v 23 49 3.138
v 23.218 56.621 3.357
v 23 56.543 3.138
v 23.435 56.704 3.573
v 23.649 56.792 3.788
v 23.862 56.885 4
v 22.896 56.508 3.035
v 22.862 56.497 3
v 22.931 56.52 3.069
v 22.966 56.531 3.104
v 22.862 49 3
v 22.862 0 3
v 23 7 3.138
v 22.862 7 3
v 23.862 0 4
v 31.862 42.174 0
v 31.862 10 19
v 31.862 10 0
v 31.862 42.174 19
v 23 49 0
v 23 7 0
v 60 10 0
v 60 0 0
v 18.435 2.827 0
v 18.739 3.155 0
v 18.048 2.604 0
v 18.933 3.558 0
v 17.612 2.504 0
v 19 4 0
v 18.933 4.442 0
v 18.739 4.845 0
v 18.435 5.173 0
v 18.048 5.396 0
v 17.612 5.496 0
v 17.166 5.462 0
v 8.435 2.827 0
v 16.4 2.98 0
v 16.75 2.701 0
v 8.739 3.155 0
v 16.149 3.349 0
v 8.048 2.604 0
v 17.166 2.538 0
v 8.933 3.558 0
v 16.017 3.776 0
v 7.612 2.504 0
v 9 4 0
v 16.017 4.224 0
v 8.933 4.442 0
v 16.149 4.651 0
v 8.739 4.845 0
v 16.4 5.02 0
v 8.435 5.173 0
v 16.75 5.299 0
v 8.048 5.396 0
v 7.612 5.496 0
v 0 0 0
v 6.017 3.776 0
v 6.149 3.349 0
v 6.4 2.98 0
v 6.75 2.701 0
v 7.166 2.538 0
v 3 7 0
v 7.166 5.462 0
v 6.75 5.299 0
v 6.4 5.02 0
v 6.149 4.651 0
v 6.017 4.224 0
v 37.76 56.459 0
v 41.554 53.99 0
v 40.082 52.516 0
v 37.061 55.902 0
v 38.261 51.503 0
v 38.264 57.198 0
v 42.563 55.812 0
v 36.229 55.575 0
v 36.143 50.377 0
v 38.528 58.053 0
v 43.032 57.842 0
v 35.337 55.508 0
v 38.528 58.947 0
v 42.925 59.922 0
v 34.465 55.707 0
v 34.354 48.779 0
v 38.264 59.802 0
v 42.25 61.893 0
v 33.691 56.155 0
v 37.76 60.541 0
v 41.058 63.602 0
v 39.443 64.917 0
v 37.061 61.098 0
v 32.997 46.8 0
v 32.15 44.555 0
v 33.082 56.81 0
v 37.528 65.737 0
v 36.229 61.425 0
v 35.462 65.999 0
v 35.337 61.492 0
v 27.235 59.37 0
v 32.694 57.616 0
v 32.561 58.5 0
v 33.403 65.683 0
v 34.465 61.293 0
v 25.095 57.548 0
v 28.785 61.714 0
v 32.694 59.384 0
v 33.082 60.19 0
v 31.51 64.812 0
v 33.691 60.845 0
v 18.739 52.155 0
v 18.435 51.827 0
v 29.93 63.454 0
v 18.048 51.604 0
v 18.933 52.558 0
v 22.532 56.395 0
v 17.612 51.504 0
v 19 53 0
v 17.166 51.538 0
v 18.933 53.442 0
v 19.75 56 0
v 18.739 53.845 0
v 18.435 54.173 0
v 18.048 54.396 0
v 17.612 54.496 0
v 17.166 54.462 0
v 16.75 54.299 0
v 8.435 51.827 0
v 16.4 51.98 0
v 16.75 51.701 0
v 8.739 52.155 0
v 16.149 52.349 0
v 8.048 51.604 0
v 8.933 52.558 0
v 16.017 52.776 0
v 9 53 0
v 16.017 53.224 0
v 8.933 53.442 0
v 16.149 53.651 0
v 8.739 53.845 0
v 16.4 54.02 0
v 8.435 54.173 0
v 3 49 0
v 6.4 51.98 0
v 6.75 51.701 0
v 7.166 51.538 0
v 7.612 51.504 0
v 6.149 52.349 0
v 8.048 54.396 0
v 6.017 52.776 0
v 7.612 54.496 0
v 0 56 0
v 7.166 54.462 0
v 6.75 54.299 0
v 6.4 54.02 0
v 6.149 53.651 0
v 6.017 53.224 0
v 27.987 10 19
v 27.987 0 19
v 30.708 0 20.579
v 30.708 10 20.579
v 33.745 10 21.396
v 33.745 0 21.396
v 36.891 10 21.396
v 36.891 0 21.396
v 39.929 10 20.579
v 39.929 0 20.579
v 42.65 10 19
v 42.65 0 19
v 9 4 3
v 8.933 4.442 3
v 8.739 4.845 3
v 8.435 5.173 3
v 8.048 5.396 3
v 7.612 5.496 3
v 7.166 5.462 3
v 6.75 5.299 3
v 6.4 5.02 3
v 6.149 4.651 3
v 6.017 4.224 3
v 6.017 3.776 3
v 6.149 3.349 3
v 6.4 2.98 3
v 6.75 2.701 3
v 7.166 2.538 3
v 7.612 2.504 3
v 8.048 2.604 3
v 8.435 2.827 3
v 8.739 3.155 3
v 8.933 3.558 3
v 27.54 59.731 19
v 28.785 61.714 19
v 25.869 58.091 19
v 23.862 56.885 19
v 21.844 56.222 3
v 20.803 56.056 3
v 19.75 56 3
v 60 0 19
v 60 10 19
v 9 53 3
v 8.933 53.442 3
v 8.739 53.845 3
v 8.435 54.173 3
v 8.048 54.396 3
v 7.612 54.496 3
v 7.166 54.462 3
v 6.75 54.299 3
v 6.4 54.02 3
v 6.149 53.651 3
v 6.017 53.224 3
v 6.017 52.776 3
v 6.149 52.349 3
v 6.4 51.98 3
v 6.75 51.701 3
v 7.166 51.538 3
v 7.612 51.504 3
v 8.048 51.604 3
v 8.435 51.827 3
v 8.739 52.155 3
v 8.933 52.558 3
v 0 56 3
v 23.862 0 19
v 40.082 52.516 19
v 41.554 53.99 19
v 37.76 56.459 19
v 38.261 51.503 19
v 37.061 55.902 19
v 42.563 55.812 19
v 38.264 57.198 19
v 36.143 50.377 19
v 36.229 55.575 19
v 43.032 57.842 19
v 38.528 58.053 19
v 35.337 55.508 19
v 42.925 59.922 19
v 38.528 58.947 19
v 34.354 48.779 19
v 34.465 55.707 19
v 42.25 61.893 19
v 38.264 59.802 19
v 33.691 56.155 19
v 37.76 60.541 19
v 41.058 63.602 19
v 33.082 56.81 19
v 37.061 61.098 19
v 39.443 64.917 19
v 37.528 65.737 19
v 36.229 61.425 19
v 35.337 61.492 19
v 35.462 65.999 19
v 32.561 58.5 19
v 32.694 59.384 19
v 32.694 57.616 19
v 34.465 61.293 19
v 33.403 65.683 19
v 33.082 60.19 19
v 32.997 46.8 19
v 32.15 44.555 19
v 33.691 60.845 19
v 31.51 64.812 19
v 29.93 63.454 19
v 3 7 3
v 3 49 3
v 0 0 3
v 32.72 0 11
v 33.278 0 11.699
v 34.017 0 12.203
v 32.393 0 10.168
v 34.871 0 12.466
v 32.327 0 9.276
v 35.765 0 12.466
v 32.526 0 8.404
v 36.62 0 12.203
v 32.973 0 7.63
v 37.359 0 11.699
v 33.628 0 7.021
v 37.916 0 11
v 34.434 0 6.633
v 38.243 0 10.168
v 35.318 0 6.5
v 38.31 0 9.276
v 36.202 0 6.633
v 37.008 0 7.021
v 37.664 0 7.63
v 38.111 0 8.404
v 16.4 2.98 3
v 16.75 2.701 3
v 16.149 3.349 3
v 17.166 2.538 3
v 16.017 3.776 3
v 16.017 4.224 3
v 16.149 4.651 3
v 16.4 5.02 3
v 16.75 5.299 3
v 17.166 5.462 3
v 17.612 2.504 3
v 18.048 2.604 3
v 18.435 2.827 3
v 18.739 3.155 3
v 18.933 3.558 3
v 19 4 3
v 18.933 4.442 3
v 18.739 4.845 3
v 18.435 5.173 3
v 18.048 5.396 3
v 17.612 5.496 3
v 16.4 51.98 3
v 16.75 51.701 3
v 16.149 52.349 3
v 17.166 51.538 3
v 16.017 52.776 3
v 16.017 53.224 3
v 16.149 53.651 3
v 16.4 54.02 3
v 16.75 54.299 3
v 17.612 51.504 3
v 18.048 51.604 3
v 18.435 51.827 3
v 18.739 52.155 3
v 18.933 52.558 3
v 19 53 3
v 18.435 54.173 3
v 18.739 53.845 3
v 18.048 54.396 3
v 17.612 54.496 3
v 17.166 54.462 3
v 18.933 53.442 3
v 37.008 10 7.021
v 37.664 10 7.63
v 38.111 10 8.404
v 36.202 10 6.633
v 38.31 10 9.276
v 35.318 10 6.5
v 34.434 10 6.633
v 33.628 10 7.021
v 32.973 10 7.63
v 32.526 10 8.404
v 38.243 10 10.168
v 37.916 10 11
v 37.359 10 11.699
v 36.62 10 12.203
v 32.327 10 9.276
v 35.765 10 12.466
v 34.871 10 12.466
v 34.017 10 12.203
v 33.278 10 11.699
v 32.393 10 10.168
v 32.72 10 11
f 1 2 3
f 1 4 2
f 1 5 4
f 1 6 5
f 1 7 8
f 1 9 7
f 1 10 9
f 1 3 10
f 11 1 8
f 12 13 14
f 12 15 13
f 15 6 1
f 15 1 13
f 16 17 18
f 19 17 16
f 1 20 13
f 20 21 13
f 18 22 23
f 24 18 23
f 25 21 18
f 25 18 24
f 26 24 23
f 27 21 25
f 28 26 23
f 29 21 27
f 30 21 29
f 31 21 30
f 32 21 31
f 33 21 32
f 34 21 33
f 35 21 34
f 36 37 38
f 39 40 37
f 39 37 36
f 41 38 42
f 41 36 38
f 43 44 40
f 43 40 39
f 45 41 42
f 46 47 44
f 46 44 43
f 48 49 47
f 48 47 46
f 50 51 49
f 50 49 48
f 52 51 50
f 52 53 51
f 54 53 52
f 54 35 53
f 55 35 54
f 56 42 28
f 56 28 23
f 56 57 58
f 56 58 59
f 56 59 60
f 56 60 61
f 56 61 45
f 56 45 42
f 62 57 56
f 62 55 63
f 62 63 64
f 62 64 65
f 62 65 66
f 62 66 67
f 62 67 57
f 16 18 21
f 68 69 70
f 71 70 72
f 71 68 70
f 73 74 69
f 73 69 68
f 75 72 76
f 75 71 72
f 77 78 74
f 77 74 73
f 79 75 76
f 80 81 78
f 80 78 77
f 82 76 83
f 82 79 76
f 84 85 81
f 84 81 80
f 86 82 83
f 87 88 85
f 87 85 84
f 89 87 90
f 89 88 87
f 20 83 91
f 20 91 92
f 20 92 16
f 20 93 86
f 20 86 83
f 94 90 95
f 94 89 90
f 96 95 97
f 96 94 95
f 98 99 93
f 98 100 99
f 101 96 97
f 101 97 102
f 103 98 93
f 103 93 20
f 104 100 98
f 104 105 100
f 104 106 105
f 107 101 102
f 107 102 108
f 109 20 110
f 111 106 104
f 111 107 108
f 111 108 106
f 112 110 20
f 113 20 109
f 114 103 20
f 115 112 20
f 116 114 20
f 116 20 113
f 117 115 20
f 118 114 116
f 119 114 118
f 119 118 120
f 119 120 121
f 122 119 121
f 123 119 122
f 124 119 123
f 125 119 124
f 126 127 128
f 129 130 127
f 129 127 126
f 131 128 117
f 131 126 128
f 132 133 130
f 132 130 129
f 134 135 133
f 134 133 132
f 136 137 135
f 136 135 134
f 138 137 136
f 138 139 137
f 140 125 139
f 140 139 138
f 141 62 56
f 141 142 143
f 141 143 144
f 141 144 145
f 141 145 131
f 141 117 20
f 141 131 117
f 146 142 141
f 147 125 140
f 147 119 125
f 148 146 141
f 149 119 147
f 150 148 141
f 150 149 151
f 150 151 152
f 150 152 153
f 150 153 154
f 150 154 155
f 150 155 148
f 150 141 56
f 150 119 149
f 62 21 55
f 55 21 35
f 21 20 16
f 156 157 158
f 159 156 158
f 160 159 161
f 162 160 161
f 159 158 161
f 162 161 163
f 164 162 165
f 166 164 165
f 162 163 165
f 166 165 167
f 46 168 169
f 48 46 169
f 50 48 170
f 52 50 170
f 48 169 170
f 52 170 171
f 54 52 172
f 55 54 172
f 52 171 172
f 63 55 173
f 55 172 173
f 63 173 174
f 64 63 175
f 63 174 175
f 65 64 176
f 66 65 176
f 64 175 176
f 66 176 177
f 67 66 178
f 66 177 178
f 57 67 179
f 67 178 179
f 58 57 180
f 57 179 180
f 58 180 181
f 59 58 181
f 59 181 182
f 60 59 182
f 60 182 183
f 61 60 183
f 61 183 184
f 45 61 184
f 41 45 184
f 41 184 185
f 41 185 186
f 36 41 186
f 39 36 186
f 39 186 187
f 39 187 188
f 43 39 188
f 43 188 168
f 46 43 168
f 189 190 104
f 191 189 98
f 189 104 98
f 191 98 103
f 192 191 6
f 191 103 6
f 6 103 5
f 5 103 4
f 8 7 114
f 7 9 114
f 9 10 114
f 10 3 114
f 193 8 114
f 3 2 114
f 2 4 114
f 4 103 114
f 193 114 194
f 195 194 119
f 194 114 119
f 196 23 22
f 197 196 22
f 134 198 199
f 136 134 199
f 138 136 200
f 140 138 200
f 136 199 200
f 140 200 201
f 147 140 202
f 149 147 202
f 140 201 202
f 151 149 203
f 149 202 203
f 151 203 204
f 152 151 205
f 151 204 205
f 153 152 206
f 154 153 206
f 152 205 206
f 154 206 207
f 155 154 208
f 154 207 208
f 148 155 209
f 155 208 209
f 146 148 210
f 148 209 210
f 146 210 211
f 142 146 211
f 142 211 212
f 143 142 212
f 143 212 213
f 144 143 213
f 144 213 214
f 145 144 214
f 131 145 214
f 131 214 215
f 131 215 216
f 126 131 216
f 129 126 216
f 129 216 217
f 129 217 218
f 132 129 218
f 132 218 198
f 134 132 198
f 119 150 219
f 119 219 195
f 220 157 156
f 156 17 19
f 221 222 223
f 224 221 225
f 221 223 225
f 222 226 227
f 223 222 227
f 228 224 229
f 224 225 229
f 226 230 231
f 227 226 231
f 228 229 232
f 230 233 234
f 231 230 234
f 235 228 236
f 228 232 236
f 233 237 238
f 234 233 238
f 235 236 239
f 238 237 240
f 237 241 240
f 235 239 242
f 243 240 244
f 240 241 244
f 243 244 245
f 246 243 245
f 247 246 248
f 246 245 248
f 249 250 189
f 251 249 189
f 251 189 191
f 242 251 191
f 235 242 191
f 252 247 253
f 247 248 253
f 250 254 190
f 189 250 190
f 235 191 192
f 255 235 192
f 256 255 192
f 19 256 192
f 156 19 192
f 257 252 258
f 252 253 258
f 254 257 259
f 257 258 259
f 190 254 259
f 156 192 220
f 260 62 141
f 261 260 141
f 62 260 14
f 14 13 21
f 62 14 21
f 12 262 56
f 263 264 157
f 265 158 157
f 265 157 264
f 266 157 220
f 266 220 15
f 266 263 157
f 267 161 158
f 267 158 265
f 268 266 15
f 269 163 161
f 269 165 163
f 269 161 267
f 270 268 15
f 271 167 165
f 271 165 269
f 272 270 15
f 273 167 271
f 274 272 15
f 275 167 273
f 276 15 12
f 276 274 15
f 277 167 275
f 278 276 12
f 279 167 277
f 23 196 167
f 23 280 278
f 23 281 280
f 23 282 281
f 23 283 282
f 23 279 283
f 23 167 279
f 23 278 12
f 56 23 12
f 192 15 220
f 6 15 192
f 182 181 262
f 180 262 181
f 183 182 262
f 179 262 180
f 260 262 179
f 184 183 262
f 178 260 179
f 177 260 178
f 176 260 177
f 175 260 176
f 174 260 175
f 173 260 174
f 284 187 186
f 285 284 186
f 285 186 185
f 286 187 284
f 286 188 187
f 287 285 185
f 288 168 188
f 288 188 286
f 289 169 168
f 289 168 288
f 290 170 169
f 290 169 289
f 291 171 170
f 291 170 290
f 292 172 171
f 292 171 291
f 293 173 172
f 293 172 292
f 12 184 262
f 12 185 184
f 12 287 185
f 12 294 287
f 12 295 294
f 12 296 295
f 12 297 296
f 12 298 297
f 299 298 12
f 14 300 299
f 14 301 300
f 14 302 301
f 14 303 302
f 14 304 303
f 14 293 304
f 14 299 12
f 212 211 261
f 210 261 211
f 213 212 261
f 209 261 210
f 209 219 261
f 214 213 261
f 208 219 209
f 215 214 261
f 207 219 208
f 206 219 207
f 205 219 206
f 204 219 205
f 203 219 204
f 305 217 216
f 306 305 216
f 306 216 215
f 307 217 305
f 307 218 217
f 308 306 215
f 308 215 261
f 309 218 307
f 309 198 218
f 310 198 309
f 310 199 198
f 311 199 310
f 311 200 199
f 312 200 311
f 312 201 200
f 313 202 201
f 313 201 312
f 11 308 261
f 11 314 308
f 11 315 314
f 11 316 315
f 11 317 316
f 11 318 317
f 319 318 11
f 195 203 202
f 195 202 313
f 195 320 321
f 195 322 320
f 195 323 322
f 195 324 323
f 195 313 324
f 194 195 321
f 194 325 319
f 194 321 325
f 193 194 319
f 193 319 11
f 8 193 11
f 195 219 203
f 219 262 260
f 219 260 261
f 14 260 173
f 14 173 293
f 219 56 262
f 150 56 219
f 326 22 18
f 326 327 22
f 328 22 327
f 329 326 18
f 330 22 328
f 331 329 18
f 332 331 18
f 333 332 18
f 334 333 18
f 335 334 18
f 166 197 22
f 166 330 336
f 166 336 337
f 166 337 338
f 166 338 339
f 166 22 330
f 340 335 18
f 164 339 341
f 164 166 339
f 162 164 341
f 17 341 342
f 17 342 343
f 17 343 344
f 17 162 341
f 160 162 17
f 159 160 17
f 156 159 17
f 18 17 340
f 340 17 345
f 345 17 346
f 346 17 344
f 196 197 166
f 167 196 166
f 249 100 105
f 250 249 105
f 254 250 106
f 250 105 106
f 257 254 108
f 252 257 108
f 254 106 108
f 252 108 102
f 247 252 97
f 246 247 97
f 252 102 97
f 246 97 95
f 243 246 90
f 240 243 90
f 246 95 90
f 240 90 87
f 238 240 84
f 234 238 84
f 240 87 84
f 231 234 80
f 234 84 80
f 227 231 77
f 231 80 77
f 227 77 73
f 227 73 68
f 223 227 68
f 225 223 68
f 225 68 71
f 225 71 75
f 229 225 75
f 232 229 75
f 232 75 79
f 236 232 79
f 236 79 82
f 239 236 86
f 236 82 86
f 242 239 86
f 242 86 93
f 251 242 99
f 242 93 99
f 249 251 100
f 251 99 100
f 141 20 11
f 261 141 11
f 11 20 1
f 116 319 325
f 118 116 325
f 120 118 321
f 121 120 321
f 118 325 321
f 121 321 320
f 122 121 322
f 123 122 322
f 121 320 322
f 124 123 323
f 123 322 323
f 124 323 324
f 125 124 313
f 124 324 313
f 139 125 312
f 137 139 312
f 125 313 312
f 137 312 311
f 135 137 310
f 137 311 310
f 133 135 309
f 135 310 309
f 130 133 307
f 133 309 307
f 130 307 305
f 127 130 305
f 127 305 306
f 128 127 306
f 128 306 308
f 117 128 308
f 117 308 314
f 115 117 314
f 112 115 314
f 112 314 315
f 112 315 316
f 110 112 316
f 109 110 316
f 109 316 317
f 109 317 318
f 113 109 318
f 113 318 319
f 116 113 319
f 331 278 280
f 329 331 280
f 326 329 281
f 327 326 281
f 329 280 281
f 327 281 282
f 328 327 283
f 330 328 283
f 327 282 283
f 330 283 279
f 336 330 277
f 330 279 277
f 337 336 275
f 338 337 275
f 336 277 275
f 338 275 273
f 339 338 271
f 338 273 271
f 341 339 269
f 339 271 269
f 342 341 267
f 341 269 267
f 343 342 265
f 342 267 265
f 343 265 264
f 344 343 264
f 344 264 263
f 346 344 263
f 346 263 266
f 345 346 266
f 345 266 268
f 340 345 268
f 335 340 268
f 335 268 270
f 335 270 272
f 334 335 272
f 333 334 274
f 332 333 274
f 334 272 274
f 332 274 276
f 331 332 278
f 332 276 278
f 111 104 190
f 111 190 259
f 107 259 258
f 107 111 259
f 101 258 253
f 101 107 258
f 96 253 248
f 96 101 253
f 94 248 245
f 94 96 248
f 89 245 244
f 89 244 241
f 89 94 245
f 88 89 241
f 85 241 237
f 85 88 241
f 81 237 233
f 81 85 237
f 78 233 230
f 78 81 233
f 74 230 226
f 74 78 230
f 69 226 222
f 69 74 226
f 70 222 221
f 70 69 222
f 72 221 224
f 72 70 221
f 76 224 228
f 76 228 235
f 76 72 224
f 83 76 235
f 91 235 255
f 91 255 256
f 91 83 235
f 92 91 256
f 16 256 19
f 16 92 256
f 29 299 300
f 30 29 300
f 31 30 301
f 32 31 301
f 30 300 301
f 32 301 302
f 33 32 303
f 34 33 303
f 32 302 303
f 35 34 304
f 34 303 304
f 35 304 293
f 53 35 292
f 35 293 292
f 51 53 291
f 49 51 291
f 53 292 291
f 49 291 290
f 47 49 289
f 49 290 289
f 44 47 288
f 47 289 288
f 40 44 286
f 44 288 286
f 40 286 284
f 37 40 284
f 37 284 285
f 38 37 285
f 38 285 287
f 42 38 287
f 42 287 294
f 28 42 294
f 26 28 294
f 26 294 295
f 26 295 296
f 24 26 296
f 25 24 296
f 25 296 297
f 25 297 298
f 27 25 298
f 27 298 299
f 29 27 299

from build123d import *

# Parameters (mm, degrees)
ESQUISSE1_W             = 60
ESQUISSE1_H             = 56
ESQUISSE1_W_2           = 20
ESQUISSE1_H_2           = 42
BOSS_EXTRU_1_DEPTH      = 3
ESQUISSE2_R             = 1.5
ENL_V_MAT_EXTRU_2_DEPTH = 83.127948958
BOSS_EXTRU_2_DEPTH      = 16
ESQUISSE4_W             = 28.138132954
ESQUISSE4_H             = 46
ENL_V_MAT_EXTRU_3_DEPTH = 84.618179841
ESQUISSE5_R             = 7.5
ESQUISSE5_R_2           = 3
BOSS_EXTRU_3_DEPTH      = 19
CONG_1_R                = 10
CONG_2_R                = 10
BOSS_EXTRU_4_DEPTH      = 10
ESQUISSE10_R            = 3
ENL_V_MAT_EXTRU_4_DEPTH = 10
CHANFREIN1_SIZE         = 1


with BuildPart() as part:
    # Esquisse1 → Boss.-Extru.1 (new body)
    with BuildSketch(Plane.XY):
        with Locations((30, 28)):
            Rectangle(ESQUISSE1_W, ESQUISSE1_H)
        with Locations((13, 28)):
            Rectangle(ESQUISSE1_W_2, ESQUISSE1_H_2, mode=Mode.SUBTRACT)
    extrude(amount=BOSS_EXTRU_1_DEPTH)

    # Esquisse2 → Enlèv. mat.-Extru.2 (cut, through all)
    with BuildSketch(Plane.XY.offset(3)):
        with Locations((7.5, 53)):
            Circle(ESQUISSE2_R)
        with Locations((17.5, 53)):
            Circle(ESQUISSE2_R)
        with Locations((7.5, 4)):
            Circle(ESQUISSE2_R)
        with Locations((17.5, 4)):
            Circle(ESQUISSE2_R)
    extrude(amount=-ENL_V_MAT_EXTRU_2_DEPTH, mode=Mode.SUBTRACT)

    # Esquisse3 → Boss.-Extru.2 (add)
    with BuildSketch(Plane.XY.offset(3)):
        Polygon((23.861867046, 56), (31.861867046, 56), (31.861867046, 10), (60, 10), (60, 0), (23.861867046, 0), align=None)
    extrude(amount=BOSS_EXTRU_2_DEPTH)

    # Esquisse4 → Enlèv. mat.-Extru.3 (cut, through all)
    with BuildSketch(Plane.XY.offset(3)):
        with Locations((45.930933523, 33)):
            Rectangle(ESQUISSE4_W, ESQUISSE4_H)
    extrude(amount=-ENL_V_MAT_EXTRU_3_DEPTH, mode=Mode.SUBTRACT)

    # Esquisse5 → Boss.-Extru.3 (add)
    with BuildSketch(Plane(origin=(0, 0, 0), x_dir=(-1, 0, 0), z_dir=(0, 0, -1))):
        with Locations((-35.561058301, 58.5)):
            Circle(ESQUISSE5_R)
        with Locations((-35.561058301, 58.5)):
            Circle(ESQUISSE5_R_2, mode=Mode.SUBTRACT)
    extrude(amount=-BOSS_EXTRU_3_DEPTH)

    # Congé1
    cong_1_edges = [part.edges().sort_by_distance(p)[0] for p in [
        (28.489990489, 56, 9.5),
    ]]
    fillet(cong_1_edges, radius=CONG_1_R)

    # Congé2
    cong_2_edges = [part.edges().sort_by_distance(p)[0] for p in [
        (31.861867046, 51.975738811, 9.5),
    ]]
    fillet(cong_2_edges, radius=CONG_2_R)

    # Esquisse9 → Boss.-Extru.4 (add)
    with BuildSketch(Plane.XZ):
        with BuildLine():
            Line((42.649653768, 19), (27.986775469, 19))
            ThreePointArc((27.986775469, 19), (35.318214618, 21.5), (42.649653768, 19))
        make_face()
    extrude(amount=-BOSS_EXTRU_4_DEPTH)

    # Esquisse10 → Enlèv. mat.-Extru.4 (cut)
    with BuildSketch(Plane.XZ):
        with Locations(Location((35.318214618, 9.5, 0), (0, 0, 270))):
            Circle(ESQUISSE10_R)
    extrude(amount=-ENL_V_MAT_EXTRU_4_DEPTH, mode=Mode.SUBTRACT)

    # Chanfrein1
    # the kernel refuses this chamfer: 1 mm, written as the material it adds along each edge
    with BuildSketch(Plane(origin=(23.861867046, 0, 3), x_dir=(0.027495876610585623, 0, 0.9996219169112968), z_dir=(0, 1, 0))) as chanfrein1_piece_1_section:
        Polygon((CHANFREIN1_SIZE * 0.999621916911, -CHANFREIN1_SIZE * 0.0274958766106), (-CHANFREIN1_SIZE * 0.0274958766106, -CHANFREIN1_SIZE * 0.999621916911), (0, 0), align=None)
    chanfrein1_piece_1 = extrude(amount=59.456320381, mode=Mode.PRIVATE)
    chanfrein1_piece_1 = split(chanfrein1_piece_1, bisect_by=Plane(origin=(23, 3.5, 3.33918952), z_dir=(1, 0, 0)), keep=Keep.TOP, mode=Mode.PRIVATE)
    chanfrein1_piece_1 = split(chanfrein1_piece_1, bisect_by=Plane(origin=(23.549970381, 7, 3.33918952), z_dir=(0, -1, 0)), keep=Keep.TOP, mode=Mode.PRIVATE)
    add(chanfrein1_piece_1)
    with BuildSketch(Plane(origin=(23.861867046, 0, 3), x_dir=(0.027495876610585623, 0, 0.9996219169112968), z_dir=(0, 1, 0))) as chanfrein1_piece_2_section:
        Polygon((CHANFREIN1_SIZE * 0.999621916911, -CHANFREIN1_SIZE * 0.0274958766106), (-CHANFREIN1_SIZE * 0.0274958766106, -CHANFREIN1_SIZE * 0.999621916911), (0, 0), align=None)
    chanfrein1_piece_2 = extrude(amount=59.456320381, mode=Mode.PRIVATE)
    chanfrein1_piece_2 = split(chanfrein1_piece_2, bisect_by=Plane(origin=(23, 3.5, 3.018362183), z_dir=(-1, 0, 0)), keep=Keep.TOP, mode=Mode.PRIVATE)
    chanfrein1_piece_2 = split(chanfrein1_piece_2, bisect_by=Plane(origin=(22.938869919, 7, 3.018362183), z_dir=(0, -1, 0)), keep=Keep.TOP, mode=Mode.PRIVATE)
    add(chanfrein1_piece_2)
    with BuildSketch(Plane(origin=(23.861867046, 0, 3), x_dir=(0.027495876610585623, 0, 0.9996219169112968), z_dir=(0, 1, 0))) as chanfrein1_piece_3_section:
        Polygon((CHANFREIN1_SIZE * 0.999621916911, -CHANFREIN1_SIZE * 0.0274958766106), (-CHANFREIN1_SIZE * 0.0274958766106, -CHANFREIN1_SIZE * 0.999621916911), (0, 0), align=None)
    chanfrein1_piece_3 = extrude(amount=59.456320381, mode=Mode.PRIVATE)
    chanfrein1_piece_3 = split(chanfrein1_piece_3, bisect_by=Plane(origin=(23.549970381, 49, 3.33918952), z_dir=(0, -1, 0)), keep=Keep.TOP, mode=Mode.PRIVATE)
    chanfrein1_piece_3 = split(chanfrein1_piece_3, bisect_by=Plane(origin=(23, 28, 3.33918952), z_dir=(1, 0, 0)), keep=Keep.TOP, mode=Mode.PRIVATE)
    chanfrein1_piece_3 = split(chanfrein1_piece_3, bisect_by=Plane(origin=(23.549970381, 7, 3.33918952), z_dir=(0, 1, 0)), keep=Keep.TOP, mode=Mode.PRIVATE)
    add(chanfrein1_piece_3)
    with BuildSketch(Plane(origin=(23.861867046, 0, 3), x_dir=(0.027495876610585623, 0, 0.9996219169112968), z_dir=(0, 1, 0))) as chanfrein1_piece_4_section:
        Polygon((CHANFREIN1_SIZE * 0.999621916911, -CHANFREIN1_SIZE * 0.0274958766106), (-CHANFREIN1_SIZE * 0.0274958766106, -CHANFREIN1_SIZE * 0.999621916911), (0, 0), align=None)
    chanfrein1_piece_4 = extrude(amount=59.456320381, mode=Mode.PRIVATE)
    chanfrein1_piece_4 = chanfrein1_piece_4 - Plane(origin=(19.74967, 66, 3.340715055), x_dir=(0.9035079029052511, -0.42857142857142916, 0), z_dir=(0, 0, -1)) * Cylinder(10, 123, mode=Mode.PRIVATE)
    chanfrein1_piece_4 = split(chanfrein1_piece_4, bisect_by=Plane(origin=(23.552807477, 49, 3.340715055), z_dir=(0, 1, 0)), keep=Keep.TOP, mode=Mode.PRIVATE)
    chanfrein1_piece_4 = split(chanfrein1_piece_4, bisect_by=Plane(origin=(23, 52.877415303, 3.340715055), z_dir=(1, 0, 0)), keep=Keep.TOP, mode=Mode.PRIVATE)
    add(chanfrein1_piece_4)
    with BuildSketch(Plane(origin=(23.861867046, 0, 3), x_dir=(0.027495876610585623, 0, 0.9996219169112968), z_dir=(0, 1, 0))) as chanfrein1_piece_5_section:
        Polygon((CHANFREIN1_SIZE * 0.999621916911, -CHANFREIN1_SIZE * 0.0274958766106), (-CHANFREIN1_SIZE * 0.0274958766106, -CHANFREIN1_SIZE * 0.999621916911), (0, 0), align=None)
    chanfrein1_piece_5 = extrude(amount=59.456320381, mode=Mode.PRIVATE)
    chanfrein1_piece_5 = chanfrein1_piece_5 - Plane(origin=(19.74967, 66, 3.018405741), x_dir=(0.9035079029052511, -0.42857142857142916, 0), z_dir=(0, 0, -1)) * Cylinder(10, 123, mode=Mode.PRIVATE)
    chanfrein1_piece_5 = split(chanfrein1_piece_5, bisect_by=Plane(origin=(22.938951148, 49, 3.018405741), z_dir=(0, 1, 0)), keep=Keep.TOP, mode=Mode.PRIVATE)
    chanfrein1_piece_5 = split(chanfrein1_piece_5, bisect_by=Plane(origin=(23, 52.761158893, 3.018405741), z_dir=(-1, 0, 0)), keep=Keep.TOP, mode=Mode.PRIVATE)
    add(chanfrein1_piece_5)


solid = part.part
